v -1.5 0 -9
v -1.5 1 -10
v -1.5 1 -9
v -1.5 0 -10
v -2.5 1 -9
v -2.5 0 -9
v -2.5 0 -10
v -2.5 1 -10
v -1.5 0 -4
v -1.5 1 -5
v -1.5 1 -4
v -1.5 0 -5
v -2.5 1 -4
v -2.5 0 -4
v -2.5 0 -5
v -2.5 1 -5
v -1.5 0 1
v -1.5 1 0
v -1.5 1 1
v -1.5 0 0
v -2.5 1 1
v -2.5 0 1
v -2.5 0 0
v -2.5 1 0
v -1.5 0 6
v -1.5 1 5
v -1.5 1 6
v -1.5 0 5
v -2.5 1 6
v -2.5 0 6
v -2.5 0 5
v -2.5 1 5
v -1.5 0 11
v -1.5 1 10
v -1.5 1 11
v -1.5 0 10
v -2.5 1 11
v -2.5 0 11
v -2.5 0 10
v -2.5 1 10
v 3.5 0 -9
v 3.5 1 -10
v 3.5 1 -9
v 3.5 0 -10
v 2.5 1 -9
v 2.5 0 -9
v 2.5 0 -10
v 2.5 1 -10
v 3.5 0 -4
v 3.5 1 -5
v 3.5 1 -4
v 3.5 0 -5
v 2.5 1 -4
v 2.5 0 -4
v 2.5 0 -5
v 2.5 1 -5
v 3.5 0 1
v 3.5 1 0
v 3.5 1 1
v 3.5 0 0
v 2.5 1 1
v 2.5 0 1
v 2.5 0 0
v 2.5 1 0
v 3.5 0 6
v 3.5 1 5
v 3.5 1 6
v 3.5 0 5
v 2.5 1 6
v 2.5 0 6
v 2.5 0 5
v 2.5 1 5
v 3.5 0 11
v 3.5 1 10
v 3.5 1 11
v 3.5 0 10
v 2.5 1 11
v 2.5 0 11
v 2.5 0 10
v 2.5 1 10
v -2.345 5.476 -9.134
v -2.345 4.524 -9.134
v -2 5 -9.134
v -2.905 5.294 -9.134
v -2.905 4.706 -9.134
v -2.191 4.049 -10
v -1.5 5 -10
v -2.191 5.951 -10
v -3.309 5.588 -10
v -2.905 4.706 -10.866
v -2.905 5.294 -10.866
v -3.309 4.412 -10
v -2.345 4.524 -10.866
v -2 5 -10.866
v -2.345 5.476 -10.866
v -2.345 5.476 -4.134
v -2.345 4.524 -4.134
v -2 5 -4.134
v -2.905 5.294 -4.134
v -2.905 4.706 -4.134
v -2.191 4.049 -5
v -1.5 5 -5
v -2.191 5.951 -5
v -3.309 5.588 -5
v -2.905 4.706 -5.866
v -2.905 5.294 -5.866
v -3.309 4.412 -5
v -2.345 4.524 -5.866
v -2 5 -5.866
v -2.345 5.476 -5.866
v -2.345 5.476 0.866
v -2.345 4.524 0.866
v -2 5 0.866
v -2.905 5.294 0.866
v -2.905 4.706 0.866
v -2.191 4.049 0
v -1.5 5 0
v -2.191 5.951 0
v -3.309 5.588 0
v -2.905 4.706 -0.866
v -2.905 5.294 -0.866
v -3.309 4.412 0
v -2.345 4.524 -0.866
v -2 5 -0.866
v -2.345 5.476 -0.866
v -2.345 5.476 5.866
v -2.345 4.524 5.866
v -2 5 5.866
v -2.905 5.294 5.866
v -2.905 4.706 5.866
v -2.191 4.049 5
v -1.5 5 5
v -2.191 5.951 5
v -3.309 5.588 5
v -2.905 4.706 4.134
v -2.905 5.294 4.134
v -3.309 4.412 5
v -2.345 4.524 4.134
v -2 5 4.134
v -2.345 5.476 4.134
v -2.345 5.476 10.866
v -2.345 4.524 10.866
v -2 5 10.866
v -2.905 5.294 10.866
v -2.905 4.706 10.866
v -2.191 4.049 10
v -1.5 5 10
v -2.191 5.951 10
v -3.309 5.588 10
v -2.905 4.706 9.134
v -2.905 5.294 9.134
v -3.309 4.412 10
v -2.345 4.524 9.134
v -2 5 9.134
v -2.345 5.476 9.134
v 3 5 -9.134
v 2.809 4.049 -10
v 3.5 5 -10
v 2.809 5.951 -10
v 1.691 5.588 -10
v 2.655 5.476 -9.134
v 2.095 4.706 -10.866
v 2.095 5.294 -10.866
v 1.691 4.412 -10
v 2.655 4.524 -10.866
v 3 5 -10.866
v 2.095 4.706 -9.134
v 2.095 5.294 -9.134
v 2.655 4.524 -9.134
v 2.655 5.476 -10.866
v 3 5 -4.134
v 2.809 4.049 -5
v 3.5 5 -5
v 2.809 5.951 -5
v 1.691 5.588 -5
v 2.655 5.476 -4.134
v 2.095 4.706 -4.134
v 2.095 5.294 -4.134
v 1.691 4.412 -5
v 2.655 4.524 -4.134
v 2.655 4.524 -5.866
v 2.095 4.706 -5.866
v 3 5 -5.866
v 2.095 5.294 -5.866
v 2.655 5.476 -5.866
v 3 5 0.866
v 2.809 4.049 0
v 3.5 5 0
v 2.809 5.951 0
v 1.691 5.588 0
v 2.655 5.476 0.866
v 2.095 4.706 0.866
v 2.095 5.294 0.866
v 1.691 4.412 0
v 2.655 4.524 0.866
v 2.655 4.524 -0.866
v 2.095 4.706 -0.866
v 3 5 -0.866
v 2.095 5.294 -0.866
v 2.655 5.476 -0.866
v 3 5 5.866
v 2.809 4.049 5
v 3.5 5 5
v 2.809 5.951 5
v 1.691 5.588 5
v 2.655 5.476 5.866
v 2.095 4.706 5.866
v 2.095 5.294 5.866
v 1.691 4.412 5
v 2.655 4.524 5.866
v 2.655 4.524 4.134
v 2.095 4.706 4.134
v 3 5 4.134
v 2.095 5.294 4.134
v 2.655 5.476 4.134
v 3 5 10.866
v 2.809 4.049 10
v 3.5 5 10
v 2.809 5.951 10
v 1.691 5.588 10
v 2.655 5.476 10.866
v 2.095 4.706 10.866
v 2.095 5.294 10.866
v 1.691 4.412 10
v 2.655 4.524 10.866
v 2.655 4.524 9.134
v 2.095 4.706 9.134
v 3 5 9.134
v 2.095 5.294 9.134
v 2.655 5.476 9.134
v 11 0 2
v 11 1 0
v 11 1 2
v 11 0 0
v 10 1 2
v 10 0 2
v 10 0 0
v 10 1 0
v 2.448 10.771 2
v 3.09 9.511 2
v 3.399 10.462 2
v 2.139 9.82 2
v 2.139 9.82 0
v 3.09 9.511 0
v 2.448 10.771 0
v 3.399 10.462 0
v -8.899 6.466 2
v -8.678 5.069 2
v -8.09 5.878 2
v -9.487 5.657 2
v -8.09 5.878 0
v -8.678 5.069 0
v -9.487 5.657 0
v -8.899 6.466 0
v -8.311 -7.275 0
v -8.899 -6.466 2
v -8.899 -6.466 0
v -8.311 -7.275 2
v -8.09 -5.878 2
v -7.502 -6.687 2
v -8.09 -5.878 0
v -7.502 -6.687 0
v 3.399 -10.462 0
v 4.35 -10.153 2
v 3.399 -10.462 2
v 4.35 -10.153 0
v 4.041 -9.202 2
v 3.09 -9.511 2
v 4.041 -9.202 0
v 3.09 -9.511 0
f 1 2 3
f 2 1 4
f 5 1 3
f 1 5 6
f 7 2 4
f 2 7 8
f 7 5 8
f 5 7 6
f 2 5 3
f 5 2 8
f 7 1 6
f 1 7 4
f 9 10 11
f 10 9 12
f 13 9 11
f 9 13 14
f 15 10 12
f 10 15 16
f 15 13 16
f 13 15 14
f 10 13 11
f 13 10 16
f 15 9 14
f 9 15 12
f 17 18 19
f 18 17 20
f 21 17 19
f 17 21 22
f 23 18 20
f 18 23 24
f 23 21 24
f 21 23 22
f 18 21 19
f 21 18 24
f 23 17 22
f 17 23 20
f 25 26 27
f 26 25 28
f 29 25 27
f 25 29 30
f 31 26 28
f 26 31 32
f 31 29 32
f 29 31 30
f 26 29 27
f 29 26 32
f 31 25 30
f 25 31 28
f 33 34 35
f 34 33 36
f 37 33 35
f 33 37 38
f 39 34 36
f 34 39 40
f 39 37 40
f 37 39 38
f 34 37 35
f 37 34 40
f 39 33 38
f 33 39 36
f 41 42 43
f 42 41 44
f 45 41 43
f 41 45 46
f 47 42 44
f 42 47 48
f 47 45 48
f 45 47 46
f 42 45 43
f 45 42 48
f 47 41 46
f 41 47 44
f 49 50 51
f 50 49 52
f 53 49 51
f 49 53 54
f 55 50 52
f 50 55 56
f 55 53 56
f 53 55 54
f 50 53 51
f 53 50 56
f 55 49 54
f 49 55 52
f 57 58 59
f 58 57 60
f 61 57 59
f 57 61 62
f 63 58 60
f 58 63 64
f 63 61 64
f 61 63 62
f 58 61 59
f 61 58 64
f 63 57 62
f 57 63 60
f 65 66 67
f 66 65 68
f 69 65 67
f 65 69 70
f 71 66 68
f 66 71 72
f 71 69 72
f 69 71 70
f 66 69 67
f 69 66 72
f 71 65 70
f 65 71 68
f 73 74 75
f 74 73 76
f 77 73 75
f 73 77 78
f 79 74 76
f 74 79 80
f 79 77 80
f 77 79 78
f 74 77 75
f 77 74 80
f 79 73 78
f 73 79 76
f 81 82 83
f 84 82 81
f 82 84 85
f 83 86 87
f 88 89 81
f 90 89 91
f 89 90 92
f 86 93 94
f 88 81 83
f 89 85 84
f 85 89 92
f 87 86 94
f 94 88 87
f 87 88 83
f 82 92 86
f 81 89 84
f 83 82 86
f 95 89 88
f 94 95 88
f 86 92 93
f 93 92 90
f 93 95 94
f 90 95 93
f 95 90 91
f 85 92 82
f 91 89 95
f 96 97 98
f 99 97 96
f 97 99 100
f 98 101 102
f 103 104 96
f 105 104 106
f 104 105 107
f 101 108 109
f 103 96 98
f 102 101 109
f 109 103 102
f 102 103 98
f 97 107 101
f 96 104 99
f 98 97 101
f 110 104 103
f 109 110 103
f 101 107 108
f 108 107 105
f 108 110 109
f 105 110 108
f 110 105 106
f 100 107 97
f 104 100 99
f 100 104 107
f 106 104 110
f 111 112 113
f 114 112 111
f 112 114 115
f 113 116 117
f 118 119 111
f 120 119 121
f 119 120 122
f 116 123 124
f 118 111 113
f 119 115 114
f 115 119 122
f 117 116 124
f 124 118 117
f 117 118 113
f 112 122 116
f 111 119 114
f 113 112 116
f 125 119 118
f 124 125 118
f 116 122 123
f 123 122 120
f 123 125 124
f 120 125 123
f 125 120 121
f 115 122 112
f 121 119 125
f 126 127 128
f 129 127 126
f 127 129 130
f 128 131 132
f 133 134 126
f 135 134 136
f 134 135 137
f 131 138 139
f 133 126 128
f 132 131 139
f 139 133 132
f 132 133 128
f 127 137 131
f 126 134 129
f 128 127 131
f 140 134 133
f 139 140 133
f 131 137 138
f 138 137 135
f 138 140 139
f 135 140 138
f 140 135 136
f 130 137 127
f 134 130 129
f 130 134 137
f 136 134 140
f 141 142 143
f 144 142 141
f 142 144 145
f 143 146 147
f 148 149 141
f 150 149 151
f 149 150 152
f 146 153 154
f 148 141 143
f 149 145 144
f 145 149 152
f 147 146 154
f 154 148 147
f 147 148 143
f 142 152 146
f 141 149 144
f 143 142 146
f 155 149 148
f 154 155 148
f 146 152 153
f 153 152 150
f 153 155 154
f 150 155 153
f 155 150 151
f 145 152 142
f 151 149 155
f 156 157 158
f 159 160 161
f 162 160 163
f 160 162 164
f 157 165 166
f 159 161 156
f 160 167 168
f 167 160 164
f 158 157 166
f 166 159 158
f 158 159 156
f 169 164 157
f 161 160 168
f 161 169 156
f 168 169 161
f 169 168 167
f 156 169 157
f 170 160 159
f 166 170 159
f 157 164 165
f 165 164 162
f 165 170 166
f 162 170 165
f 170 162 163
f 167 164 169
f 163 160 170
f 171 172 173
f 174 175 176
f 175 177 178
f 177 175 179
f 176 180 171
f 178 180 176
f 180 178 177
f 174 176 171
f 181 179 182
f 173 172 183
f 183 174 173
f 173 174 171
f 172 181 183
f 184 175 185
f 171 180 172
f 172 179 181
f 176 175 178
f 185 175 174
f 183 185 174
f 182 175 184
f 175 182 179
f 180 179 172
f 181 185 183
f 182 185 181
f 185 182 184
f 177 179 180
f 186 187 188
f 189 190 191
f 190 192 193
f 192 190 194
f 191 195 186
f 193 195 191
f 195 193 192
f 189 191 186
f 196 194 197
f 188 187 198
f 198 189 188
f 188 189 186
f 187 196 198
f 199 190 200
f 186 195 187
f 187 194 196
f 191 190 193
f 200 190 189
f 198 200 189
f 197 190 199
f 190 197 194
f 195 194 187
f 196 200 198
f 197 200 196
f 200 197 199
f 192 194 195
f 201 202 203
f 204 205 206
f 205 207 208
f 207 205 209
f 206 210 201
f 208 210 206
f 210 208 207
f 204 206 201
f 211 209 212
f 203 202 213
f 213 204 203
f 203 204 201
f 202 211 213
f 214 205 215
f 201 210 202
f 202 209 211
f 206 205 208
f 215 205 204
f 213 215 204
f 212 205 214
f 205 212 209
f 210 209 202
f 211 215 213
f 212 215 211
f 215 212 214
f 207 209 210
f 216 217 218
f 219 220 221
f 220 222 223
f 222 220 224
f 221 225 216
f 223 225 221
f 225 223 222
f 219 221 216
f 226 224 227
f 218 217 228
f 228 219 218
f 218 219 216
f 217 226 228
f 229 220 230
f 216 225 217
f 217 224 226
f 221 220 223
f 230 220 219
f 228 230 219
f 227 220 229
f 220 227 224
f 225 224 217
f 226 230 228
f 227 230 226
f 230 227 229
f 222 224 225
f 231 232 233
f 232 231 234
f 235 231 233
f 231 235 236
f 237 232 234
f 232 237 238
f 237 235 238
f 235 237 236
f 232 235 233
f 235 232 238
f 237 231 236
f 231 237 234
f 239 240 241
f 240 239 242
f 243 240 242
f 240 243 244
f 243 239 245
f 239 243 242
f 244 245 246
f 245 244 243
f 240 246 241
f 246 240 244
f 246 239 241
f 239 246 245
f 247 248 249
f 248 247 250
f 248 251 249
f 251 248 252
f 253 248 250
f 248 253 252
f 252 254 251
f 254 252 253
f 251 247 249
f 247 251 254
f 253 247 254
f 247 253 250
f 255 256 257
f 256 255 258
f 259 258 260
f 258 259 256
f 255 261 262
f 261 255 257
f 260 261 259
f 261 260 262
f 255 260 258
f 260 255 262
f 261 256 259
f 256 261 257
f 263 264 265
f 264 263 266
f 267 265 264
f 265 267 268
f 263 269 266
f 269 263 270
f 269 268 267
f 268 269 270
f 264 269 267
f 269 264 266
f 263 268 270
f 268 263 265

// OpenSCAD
module array(v_count, v_offset, center = false)
{
    translate(
        center?
            [
                -0.5*(v_count[0] - 1)*v_offset[0],
                -0.5*(v_count[1] - 1)*v_offset[1],
                -0.5*(v_count[2] - 1)*v_offset[2]
            ]
            : 0
    )
        for (n=[0:1:$children - 1])
        for (i=[0:1:v_count[0] - 1])
        for (j=[0:1:v_count[1] - 1])
        for (k=[0:1:v_count[2] - 1])
            translate([v_offset[0]*i, v_offset[1]*j, v_offset[2]*k])
                children(n);
}

module polar_array(count, radius, start_angle, end_angle)
{
    da = (end_angle - start_angle)/count;

    for (n=[0:1:$children - 1])
    for (i=[0:1:count - 1])
        rotate([0, 0, start_angle + da*i])
        translate([radius, 0, 0])
            children(n);
}


array(
    v_count=[2, 1, 5],
    v_offset=[5, 5, 5],
    center=true
)
{
    cube(1);
    translate([0, 5, 0])
        sphere(1);
}

polar_array(
    count=5,
    radius=10,
    start_angle=0,
    end_angle=360
)
    cube([1, 1, 2]);
